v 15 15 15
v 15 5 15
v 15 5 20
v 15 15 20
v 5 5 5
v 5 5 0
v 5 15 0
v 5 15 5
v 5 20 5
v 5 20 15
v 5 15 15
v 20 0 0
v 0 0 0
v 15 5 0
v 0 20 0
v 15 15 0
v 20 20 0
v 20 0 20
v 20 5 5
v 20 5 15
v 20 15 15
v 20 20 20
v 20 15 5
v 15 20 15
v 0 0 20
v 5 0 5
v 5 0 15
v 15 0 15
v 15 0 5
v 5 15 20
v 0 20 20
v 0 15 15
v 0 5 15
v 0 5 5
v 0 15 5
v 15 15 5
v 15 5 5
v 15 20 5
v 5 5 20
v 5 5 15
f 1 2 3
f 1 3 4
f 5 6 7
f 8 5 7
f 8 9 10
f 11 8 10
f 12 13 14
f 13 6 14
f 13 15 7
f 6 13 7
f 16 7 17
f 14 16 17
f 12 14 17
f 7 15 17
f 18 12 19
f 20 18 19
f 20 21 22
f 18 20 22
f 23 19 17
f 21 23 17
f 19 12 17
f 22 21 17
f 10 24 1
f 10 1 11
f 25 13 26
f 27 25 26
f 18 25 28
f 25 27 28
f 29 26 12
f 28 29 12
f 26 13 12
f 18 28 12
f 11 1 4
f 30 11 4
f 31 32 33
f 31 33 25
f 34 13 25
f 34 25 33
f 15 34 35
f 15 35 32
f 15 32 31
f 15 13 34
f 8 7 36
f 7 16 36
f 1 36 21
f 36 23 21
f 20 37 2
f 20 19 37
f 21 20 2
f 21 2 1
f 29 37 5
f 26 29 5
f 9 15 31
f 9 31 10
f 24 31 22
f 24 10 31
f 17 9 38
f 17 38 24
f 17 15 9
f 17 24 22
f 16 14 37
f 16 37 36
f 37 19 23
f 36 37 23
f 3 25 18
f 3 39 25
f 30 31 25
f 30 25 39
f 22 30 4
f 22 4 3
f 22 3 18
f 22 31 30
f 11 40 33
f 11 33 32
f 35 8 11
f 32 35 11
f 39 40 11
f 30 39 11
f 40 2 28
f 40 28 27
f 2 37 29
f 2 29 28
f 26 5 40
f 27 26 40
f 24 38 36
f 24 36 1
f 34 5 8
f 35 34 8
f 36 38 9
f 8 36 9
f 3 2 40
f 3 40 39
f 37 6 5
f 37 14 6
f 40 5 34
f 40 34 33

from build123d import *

# Parameters (mm, degrees)
F0_W     = 20
F0_H     = 20
F0_W_2   = 10
F0_H_2   = 10
F1_DEPTH = 20
F2_W     = 10
F2_H     = 10
F3_DEPTH = 20.001
F4_W     = 10
F4_H     = 10
F5_DEPTH = 20.001


with BuildPart() as f1:
    # F0 (on Top) → F1 (new body)
    with BuildSketch(Plane.XY):
        with Locations((10, 10)):
            Rectangle(F0_W, F0_H)
        with Locations((10, 10)):
            Rectangle(F0_W_2, F0_H_2, mode=Mode.SUBTRACT)
    extrude(amount=F1_DEPTH)

    # F2 (on face) → F3 (cut, through all)
    with BuildSketch(Plane.YZ.offset(20)):
        with Locations((10, 10)):
            Rectangle(F2_W, F2_H)
    extrude(amount=-F3_DEPTH, mode=Mode.SUBTRACT)

    # F4 (on face) → F5 (cut, through all)
    with BuildSketch(Plane(origin=(0, 20, 0), x_dir=(-1, 0, 0), z_dir=(0, 1, 0))):
        with Locations((-10, 10)):
            Rectangle(F4_W, F4_H)
    extrude(amount=-F5_DEPTH, mode=Mode.SUBTRACT)


solid = f1.part
